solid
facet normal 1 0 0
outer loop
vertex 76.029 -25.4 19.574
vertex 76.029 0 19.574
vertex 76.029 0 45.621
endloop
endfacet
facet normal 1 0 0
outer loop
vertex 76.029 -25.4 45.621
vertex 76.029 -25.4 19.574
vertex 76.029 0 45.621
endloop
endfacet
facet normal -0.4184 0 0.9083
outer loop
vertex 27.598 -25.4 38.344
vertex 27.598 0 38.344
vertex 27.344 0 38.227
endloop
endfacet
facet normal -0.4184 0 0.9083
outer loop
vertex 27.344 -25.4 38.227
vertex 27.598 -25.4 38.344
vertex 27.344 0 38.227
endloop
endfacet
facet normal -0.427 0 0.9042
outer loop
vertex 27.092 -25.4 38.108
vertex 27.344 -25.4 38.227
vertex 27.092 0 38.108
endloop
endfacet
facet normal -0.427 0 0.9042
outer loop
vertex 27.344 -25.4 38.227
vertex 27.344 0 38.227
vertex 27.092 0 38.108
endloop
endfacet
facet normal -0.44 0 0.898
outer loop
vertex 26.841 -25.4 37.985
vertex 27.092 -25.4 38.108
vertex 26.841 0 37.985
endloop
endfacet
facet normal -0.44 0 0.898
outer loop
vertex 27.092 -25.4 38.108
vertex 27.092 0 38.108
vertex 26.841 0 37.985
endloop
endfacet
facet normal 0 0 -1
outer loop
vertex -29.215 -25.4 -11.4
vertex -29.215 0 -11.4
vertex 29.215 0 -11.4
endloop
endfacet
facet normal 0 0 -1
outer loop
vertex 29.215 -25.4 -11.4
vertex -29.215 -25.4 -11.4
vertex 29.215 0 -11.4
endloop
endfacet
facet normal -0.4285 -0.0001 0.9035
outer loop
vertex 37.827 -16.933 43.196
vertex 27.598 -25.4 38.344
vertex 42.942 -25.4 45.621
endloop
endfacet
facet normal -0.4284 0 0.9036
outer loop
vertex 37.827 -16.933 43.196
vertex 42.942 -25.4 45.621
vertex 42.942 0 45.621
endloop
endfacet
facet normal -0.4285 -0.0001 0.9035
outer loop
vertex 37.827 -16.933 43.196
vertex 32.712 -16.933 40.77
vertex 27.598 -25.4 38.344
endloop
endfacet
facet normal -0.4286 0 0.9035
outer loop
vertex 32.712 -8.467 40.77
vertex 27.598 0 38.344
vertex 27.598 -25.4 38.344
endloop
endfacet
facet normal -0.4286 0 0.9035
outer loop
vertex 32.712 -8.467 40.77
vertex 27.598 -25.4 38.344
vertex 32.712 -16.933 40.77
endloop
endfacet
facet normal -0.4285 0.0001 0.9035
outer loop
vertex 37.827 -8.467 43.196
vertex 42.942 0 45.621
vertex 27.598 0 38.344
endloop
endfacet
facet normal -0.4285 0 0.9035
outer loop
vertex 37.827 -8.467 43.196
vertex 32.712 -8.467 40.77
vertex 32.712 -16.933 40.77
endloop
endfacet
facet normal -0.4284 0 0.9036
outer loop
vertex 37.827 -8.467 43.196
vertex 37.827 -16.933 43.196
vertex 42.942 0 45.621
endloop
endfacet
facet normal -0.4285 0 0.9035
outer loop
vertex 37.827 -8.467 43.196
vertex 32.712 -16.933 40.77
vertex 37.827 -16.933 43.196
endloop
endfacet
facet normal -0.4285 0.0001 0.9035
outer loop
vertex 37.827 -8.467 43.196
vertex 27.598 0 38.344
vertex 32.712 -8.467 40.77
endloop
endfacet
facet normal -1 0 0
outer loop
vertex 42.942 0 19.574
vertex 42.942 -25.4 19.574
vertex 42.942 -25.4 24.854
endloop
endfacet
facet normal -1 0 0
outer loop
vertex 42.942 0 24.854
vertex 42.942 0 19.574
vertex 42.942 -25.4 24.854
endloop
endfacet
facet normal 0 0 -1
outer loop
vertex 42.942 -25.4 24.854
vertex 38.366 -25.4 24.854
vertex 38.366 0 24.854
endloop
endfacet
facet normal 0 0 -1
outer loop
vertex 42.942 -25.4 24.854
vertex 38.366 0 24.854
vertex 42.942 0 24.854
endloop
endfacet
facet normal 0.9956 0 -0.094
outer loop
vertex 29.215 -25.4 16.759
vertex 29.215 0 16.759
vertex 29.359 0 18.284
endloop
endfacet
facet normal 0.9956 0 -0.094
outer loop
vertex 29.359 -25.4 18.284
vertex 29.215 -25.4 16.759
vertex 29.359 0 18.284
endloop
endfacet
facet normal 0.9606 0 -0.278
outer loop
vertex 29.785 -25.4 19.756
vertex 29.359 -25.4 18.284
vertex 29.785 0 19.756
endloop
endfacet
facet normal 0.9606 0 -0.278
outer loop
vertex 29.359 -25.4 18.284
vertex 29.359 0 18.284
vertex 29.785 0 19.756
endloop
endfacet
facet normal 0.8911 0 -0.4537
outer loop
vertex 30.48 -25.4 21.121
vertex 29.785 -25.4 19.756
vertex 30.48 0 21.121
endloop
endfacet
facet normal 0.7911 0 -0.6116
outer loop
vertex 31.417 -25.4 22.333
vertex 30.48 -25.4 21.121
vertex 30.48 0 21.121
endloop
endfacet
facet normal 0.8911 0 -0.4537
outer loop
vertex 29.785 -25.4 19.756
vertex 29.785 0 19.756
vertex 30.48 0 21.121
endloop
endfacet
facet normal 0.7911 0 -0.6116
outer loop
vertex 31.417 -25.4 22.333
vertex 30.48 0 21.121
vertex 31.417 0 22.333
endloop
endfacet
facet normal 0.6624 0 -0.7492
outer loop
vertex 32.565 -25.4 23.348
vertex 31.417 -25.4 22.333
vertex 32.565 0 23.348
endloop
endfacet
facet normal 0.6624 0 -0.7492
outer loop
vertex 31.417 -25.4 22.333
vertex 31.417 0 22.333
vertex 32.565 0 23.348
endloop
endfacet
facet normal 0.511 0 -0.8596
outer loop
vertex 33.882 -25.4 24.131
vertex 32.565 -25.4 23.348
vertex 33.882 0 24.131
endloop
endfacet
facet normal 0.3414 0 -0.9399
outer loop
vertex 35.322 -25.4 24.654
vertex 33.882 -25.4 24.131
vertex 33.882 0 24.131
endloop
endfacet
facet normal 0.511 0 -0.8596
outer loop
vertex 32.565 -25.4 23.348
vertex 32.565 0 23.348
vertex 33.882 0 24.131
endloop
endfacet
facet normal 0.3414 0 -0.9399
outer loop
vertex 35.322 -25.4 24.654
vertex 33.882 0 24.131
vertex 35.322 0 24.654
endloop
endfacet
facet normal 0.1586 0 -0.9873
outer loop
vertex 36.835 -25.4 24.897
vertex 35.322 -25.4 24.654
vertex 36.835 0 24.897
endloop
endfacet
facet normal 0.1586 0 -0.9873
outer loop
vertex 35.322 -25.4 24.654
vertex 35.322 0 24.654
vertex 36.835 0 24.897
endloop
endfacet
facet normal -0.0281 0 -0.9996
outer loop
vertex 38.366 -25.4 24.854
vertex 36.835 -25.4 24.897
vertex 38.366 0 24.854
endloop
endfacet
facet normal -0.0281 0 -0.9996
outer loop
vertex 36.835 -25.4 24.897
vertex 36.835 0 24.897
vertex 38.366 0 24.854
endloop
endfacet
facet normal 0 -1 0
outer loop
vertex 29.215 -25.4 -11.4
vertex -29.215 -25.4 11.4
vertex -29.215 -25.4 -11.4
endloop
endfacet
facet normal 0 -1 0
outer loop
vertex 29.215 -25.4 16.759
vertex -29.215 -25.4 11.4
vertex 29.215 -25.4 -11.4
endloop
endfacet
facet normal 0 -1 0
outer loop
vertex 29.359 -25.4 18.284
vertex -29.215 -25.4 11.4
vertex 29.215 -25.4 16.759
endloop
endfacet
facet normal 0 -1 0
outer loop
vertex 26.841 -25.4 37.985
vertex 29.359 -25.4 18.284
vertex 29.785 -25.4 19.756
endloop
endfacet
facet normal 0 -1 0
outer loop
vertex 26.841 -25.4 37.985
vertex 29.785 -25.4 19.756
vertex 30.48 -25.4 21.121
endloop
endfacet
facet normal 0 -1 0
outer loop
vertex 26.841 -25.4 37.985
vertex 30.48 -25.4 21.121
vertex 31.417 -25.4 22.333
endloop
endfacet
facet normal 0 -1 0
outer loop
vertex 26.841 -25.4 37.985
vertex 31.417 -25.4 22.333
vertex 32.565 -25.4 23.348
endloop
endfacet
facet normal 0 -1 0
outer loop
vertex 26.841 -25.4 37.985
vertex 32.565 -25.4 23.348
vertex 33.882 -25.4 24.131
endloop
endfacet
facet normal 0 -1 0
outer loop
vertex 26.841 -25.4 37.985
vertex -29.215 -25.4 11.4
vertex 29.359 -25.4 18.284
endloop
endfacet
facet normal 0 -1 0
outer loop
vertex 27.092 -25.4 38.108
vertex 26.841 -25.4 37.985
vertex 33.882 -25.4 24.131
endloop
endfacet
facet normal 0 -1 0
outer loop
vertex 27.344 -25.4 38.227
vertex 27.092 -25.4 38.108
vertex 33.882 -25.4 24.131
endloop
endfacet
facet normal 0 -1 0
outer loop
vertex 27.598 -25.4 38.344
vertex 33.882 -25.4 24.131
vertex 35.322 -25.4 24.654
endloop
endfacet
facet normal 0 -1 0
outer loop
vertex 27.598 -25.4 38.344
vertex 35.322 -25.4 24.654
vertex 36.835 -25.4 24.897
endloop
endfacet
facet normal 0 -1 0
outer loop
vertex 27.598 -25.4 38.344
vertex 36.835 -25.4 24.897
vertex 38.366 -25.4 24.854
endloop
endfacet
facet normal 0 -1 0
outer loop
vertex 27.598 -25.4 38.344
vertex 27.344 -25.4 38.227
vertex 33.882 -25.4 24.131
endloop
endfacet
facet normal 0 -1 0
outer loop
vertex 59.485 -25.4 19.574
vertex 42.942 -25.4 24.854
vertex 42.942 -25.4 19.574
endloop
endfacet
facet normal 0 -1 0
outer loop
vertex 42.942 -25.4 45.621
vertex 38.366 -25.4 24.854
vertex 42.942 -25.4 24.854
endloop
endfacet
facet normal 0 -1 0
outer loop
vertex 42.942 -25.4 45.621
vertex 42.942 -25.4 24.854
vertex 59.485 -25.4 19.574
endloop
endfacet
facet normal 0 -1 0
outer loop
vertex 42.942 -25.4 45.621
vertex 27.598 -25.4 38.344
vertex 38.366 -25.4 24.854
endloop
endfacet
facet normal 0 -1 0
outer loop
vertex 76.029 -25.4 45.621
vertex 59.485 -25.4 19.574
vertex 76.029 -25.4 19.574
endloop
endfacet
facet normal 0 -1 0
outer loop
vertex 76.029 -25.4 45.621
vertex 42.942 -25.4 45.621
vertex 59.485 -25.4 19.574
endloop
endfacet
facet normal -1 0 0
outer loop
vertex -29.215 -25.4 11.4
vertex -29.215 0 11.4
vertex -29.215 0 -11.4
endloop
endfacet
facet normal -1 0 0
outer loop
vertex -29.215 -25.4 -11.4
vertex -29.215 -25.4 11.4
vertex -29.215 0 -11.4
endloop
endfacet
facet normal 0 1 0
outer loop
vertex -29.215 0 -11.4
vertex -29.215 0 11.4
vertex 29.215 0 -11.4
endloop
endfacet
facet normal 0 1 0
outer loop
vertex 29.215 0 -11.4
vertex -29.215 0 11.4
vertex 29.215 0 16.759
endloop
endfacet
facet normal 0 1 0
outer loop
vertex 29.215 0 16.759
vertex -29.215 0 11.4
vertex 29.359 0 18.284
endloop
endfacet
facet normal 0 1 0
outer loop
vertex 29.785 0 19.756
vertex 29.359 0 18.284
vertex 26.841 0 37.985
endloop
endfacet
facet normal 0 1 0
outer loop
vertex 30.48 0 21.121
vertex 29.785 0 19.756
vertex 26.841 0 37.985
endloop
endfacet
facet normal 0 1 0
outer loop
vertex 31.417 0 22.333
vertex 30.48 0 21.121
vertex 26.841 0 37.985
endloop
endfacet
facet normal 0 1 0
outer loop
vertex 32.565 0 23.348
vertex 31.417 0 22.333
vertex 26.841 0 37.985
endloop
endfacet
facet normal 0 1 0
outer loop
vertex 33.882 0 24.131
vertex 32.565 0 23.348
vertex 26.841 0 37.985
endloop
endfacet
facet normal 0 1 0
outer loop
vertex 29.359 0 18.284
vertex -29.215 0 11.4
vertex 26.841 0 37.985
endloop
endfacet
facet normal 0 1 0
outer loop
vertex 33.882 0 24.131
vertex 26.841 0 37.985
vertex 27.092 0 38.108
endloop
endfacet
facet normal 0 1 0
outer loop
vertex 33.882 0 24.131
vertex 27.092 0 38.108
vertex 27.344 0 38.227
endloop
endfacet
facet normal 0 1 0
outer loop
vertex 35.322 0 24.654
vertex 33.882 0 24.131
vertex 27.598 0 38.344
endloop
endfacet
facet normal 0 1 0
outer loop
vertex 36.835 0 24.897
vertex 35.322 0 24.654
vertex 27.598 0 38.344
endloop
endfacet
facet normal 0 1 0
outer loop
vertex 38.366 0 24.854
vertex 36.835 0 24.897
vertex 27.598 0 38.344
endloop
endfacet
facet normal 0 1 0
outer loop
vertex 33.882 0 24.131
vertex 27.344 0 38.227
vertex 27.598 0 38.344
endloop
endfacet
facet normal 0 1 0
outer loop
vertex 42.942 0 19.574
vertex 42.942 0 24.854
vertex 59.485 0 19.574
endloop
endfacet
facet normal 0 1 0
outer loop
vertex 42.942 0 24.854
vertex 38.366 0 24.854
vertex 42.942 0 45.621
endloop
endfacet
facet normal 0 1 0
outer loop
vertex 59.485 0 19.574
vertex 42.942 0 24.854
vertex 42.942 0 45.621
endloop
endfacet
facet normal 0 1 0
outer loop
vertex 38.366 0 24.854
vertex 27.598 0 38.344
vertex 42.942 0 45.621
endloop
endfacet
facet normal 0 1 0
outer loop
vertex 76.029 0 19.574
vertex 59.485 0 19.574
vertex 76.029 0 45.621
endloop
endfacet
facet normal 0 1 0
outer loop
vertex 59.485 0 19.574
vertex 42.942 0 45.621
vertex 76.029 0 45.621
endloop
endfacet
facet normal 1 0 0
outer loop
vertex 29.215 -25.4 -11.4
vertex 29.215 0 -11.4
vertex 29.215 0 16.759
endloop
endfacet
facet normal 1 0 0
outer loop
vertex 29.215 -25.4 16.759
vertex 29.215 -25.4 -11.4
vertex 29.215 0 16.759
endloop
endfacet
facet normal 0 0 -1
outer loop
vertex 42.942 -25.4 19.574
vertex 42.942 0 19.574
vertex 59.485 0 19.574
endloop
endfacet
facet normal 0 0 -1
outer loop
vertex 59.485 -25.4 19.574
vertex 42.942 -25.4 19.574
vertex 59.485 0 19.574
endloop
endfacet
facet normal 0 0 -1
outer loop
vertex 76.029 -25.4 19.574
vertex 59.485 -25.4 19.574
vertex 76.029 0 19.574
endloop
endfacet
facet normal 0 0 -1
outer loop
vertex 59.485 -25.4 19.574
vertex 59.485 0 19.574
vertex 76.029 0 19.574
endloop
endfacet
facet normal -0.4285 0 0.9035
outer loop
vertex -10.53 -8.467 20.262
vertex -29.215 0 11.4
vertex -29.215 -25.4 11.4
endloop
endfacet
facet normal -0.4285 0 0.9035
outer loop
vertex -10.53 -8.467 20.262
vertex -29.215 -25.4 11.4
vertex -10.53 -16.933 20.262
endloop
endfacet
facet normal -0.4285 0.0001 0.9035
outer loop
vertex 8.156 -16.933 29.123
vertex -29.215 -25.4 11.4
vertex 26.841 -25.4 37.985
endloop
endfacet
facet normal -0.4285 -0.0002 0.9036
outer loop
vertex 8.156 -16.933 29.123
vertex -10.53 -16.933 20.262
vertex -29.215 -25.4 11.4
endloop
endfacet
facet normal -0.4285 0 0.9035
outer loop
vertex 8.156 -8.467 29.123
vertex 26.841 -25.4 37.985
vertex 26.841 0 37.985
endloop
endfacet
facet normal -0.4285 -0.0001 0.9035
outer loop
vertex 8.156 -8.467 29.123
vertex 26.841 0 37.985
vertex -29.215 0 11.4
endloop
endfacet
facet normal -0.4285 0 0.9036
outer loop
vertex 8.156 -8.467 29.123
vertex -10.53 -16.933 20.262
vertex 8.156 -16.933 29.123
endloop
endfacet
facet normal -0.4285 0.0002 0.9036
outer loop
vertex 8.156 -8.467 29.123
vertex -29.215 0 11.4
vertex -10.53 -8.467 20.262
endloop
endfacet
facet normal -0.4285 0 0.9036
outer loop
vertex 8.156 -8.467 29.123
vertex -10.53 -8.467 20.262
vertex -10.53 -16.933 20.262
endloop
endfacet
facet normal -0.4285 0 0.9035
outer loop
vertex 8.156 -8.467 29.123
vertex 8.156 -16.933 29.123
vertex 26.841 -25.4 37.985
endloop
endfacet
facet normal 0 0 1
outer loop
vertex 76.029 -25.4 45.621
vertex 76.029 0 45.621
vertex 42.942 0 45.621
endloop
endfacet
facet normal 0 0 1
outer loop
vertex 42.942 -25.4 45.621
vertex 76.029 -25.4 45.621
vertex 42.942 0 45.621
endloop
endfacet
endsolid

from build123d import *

# Parameters (mm, degrees)
F0_W     = 16.5432430804
F0_H     = 5.2285930142
F0_H_2   = 5.2797589451
F0_H_3   = 15.5384643003
F1_DEPTH = 25.4


with BuildPart() as f1:
    # F0 (on Front) → F1 (new body)
    with BuildSketch(Plane.XZ):
        Polygon((-29.214669019, 11.400138028), (-29.214669019, -11.400138028), (29.214669019, -11.400138028), (29.214669019, 11.400138028), (13.6762047186, 11.400138028), align=None)
        with BuildLine():
            add(Edge.make_bspline(
                [(-29.214669019, 11.400138028), (-10.5295465785, 20.2617670077), (8.155575862, 29.1233959875), (26.8406983024, 37.9850249672)],
                knots=[0, 0, 0, 0, 62.0399904828, 62.0399904828, 62.0399904828, 62.0399904828], degree=3))
            Line((-29.214669019, 11.400138028), (13.6762047186, 11.400138028))
            Line((13.6762047186, 11.400138028), (13.6762047186, 16.7585816234))
            ThreePointArc((13.6762047186, 16.7585816234), (17.2345044889, 29.2472343565), (26.8406983024, 37.9850249672))
        make_face()
        with BuildLine():
            Line((13.6762047186, 11.400138028), (29.214669019, 11.400138028))
            Line((29.214669019, 11.400138028), (29.214669019, 16.7585816234))
            ThreePointArc((29.214669019, 16.7585816234), (31.9669047322, 22.8678129764), (38.3662581444, 24.8542129993))
            Line((38.3662581444, 24.8542129993), (42.9420471191, 24.8542129993))
            Line((42.9420471191, 24.8542129993), (42.9420471191, 40.3926772997))
            Line((42.9420471191, 40.3926772997), (39.0692595726, 40.3926772997))
            ThreePointArc((39.0692595726, 40.3926772997), (33.2055864152, 40.0845606606), (27.5977154023, 38.3440488212))
            add(Edge.make_bspline(
                [(26.8406983024, 37.9850249672), (27.0930373357, 38.1046995852), (27.345376369, 38.2243742032), (27.5977154023, 38.3440488212)],
                knots=[62.0399904828, 62.0399904828, 62.0399904828, 62.0399904828, 62.877828783, 62.877828783, 62.877828783, 62.877828783], degree=3))
            ThreePointArc((26.8406983024, 37.9850249672), (17.2345044889, 29.2472343565), (13.6762047186, 16.7585816234))
            Line((13.6762047186, 16.7585816234), (13.6762047186, 11.400138028))
        make_face()
        with BuildLine():
            ThreePointArc((27.5977154023, 38.3440488212), (27.217619876, 38.1678831015), (26.8406983024, 37.9850249672))
            add(Edge.make_bspline(
                [(26.8406983024, 37.9850249672), (27.0930373357, 38.1046995852), (27.345376369, 38.2243742032), (27.5977154023, 38.3440488212)],
                knots=[62.0399904828, 62.0399904828, 62.0399904828, 62.0399904828, 62.877828783, 62.877828783, 62.877828783, 62.877828783], degree=3))
        make_face()
        with BuildLine():
            add(Edge.make_bspline(
                [(27.5977154023, 38.3440488212), (32.7124926413, 40.7697893188), (37.8272698802, 43.1955298163), (42.9420471191, 45.6212703139)],
                knots=[62.877828783, 62.877828783, 62.877828783, 62.877828783, 79.8603630017, 79.8603630017, 79.8603630017, 79.8603630017], degree=3))
            ThreePointArc((27.5977154023, 38.3440488212), (33.2055864152, 40.0845606606), (39.0692595726, 40.3926772997))
            Line((39.0692595726, 40.3926772997), (42.9420471191, 40.3926772997))
            Line((42.9420471191, 40.3926772997), (42.9420471191, 45.6212703139))
        make_face()
        with Locations((51.2136686593, 43.0069738068)):
            Rectangle(F0_W, F0_H)
        with Locations((51.2136686593, 22.2143335268)):
            Rectangle(F0_W, F0_H_2)
        with Locations((51.2136686593, 32.6234451495)):
            Rectangle(F0_W, F0_H_3)
        Polygon((76.0285332799, 45.6212703139), (59.4852901995, 45.6212703139), (59.4852901995, 40.3926772997), (59.4852901995, 24.8542129993), (59.4852901995, 19.5744540542), (76.0285332799, 19.5744540542), align=None)
    extrude(amount=F1_DEPTH)


solid = f1.part
